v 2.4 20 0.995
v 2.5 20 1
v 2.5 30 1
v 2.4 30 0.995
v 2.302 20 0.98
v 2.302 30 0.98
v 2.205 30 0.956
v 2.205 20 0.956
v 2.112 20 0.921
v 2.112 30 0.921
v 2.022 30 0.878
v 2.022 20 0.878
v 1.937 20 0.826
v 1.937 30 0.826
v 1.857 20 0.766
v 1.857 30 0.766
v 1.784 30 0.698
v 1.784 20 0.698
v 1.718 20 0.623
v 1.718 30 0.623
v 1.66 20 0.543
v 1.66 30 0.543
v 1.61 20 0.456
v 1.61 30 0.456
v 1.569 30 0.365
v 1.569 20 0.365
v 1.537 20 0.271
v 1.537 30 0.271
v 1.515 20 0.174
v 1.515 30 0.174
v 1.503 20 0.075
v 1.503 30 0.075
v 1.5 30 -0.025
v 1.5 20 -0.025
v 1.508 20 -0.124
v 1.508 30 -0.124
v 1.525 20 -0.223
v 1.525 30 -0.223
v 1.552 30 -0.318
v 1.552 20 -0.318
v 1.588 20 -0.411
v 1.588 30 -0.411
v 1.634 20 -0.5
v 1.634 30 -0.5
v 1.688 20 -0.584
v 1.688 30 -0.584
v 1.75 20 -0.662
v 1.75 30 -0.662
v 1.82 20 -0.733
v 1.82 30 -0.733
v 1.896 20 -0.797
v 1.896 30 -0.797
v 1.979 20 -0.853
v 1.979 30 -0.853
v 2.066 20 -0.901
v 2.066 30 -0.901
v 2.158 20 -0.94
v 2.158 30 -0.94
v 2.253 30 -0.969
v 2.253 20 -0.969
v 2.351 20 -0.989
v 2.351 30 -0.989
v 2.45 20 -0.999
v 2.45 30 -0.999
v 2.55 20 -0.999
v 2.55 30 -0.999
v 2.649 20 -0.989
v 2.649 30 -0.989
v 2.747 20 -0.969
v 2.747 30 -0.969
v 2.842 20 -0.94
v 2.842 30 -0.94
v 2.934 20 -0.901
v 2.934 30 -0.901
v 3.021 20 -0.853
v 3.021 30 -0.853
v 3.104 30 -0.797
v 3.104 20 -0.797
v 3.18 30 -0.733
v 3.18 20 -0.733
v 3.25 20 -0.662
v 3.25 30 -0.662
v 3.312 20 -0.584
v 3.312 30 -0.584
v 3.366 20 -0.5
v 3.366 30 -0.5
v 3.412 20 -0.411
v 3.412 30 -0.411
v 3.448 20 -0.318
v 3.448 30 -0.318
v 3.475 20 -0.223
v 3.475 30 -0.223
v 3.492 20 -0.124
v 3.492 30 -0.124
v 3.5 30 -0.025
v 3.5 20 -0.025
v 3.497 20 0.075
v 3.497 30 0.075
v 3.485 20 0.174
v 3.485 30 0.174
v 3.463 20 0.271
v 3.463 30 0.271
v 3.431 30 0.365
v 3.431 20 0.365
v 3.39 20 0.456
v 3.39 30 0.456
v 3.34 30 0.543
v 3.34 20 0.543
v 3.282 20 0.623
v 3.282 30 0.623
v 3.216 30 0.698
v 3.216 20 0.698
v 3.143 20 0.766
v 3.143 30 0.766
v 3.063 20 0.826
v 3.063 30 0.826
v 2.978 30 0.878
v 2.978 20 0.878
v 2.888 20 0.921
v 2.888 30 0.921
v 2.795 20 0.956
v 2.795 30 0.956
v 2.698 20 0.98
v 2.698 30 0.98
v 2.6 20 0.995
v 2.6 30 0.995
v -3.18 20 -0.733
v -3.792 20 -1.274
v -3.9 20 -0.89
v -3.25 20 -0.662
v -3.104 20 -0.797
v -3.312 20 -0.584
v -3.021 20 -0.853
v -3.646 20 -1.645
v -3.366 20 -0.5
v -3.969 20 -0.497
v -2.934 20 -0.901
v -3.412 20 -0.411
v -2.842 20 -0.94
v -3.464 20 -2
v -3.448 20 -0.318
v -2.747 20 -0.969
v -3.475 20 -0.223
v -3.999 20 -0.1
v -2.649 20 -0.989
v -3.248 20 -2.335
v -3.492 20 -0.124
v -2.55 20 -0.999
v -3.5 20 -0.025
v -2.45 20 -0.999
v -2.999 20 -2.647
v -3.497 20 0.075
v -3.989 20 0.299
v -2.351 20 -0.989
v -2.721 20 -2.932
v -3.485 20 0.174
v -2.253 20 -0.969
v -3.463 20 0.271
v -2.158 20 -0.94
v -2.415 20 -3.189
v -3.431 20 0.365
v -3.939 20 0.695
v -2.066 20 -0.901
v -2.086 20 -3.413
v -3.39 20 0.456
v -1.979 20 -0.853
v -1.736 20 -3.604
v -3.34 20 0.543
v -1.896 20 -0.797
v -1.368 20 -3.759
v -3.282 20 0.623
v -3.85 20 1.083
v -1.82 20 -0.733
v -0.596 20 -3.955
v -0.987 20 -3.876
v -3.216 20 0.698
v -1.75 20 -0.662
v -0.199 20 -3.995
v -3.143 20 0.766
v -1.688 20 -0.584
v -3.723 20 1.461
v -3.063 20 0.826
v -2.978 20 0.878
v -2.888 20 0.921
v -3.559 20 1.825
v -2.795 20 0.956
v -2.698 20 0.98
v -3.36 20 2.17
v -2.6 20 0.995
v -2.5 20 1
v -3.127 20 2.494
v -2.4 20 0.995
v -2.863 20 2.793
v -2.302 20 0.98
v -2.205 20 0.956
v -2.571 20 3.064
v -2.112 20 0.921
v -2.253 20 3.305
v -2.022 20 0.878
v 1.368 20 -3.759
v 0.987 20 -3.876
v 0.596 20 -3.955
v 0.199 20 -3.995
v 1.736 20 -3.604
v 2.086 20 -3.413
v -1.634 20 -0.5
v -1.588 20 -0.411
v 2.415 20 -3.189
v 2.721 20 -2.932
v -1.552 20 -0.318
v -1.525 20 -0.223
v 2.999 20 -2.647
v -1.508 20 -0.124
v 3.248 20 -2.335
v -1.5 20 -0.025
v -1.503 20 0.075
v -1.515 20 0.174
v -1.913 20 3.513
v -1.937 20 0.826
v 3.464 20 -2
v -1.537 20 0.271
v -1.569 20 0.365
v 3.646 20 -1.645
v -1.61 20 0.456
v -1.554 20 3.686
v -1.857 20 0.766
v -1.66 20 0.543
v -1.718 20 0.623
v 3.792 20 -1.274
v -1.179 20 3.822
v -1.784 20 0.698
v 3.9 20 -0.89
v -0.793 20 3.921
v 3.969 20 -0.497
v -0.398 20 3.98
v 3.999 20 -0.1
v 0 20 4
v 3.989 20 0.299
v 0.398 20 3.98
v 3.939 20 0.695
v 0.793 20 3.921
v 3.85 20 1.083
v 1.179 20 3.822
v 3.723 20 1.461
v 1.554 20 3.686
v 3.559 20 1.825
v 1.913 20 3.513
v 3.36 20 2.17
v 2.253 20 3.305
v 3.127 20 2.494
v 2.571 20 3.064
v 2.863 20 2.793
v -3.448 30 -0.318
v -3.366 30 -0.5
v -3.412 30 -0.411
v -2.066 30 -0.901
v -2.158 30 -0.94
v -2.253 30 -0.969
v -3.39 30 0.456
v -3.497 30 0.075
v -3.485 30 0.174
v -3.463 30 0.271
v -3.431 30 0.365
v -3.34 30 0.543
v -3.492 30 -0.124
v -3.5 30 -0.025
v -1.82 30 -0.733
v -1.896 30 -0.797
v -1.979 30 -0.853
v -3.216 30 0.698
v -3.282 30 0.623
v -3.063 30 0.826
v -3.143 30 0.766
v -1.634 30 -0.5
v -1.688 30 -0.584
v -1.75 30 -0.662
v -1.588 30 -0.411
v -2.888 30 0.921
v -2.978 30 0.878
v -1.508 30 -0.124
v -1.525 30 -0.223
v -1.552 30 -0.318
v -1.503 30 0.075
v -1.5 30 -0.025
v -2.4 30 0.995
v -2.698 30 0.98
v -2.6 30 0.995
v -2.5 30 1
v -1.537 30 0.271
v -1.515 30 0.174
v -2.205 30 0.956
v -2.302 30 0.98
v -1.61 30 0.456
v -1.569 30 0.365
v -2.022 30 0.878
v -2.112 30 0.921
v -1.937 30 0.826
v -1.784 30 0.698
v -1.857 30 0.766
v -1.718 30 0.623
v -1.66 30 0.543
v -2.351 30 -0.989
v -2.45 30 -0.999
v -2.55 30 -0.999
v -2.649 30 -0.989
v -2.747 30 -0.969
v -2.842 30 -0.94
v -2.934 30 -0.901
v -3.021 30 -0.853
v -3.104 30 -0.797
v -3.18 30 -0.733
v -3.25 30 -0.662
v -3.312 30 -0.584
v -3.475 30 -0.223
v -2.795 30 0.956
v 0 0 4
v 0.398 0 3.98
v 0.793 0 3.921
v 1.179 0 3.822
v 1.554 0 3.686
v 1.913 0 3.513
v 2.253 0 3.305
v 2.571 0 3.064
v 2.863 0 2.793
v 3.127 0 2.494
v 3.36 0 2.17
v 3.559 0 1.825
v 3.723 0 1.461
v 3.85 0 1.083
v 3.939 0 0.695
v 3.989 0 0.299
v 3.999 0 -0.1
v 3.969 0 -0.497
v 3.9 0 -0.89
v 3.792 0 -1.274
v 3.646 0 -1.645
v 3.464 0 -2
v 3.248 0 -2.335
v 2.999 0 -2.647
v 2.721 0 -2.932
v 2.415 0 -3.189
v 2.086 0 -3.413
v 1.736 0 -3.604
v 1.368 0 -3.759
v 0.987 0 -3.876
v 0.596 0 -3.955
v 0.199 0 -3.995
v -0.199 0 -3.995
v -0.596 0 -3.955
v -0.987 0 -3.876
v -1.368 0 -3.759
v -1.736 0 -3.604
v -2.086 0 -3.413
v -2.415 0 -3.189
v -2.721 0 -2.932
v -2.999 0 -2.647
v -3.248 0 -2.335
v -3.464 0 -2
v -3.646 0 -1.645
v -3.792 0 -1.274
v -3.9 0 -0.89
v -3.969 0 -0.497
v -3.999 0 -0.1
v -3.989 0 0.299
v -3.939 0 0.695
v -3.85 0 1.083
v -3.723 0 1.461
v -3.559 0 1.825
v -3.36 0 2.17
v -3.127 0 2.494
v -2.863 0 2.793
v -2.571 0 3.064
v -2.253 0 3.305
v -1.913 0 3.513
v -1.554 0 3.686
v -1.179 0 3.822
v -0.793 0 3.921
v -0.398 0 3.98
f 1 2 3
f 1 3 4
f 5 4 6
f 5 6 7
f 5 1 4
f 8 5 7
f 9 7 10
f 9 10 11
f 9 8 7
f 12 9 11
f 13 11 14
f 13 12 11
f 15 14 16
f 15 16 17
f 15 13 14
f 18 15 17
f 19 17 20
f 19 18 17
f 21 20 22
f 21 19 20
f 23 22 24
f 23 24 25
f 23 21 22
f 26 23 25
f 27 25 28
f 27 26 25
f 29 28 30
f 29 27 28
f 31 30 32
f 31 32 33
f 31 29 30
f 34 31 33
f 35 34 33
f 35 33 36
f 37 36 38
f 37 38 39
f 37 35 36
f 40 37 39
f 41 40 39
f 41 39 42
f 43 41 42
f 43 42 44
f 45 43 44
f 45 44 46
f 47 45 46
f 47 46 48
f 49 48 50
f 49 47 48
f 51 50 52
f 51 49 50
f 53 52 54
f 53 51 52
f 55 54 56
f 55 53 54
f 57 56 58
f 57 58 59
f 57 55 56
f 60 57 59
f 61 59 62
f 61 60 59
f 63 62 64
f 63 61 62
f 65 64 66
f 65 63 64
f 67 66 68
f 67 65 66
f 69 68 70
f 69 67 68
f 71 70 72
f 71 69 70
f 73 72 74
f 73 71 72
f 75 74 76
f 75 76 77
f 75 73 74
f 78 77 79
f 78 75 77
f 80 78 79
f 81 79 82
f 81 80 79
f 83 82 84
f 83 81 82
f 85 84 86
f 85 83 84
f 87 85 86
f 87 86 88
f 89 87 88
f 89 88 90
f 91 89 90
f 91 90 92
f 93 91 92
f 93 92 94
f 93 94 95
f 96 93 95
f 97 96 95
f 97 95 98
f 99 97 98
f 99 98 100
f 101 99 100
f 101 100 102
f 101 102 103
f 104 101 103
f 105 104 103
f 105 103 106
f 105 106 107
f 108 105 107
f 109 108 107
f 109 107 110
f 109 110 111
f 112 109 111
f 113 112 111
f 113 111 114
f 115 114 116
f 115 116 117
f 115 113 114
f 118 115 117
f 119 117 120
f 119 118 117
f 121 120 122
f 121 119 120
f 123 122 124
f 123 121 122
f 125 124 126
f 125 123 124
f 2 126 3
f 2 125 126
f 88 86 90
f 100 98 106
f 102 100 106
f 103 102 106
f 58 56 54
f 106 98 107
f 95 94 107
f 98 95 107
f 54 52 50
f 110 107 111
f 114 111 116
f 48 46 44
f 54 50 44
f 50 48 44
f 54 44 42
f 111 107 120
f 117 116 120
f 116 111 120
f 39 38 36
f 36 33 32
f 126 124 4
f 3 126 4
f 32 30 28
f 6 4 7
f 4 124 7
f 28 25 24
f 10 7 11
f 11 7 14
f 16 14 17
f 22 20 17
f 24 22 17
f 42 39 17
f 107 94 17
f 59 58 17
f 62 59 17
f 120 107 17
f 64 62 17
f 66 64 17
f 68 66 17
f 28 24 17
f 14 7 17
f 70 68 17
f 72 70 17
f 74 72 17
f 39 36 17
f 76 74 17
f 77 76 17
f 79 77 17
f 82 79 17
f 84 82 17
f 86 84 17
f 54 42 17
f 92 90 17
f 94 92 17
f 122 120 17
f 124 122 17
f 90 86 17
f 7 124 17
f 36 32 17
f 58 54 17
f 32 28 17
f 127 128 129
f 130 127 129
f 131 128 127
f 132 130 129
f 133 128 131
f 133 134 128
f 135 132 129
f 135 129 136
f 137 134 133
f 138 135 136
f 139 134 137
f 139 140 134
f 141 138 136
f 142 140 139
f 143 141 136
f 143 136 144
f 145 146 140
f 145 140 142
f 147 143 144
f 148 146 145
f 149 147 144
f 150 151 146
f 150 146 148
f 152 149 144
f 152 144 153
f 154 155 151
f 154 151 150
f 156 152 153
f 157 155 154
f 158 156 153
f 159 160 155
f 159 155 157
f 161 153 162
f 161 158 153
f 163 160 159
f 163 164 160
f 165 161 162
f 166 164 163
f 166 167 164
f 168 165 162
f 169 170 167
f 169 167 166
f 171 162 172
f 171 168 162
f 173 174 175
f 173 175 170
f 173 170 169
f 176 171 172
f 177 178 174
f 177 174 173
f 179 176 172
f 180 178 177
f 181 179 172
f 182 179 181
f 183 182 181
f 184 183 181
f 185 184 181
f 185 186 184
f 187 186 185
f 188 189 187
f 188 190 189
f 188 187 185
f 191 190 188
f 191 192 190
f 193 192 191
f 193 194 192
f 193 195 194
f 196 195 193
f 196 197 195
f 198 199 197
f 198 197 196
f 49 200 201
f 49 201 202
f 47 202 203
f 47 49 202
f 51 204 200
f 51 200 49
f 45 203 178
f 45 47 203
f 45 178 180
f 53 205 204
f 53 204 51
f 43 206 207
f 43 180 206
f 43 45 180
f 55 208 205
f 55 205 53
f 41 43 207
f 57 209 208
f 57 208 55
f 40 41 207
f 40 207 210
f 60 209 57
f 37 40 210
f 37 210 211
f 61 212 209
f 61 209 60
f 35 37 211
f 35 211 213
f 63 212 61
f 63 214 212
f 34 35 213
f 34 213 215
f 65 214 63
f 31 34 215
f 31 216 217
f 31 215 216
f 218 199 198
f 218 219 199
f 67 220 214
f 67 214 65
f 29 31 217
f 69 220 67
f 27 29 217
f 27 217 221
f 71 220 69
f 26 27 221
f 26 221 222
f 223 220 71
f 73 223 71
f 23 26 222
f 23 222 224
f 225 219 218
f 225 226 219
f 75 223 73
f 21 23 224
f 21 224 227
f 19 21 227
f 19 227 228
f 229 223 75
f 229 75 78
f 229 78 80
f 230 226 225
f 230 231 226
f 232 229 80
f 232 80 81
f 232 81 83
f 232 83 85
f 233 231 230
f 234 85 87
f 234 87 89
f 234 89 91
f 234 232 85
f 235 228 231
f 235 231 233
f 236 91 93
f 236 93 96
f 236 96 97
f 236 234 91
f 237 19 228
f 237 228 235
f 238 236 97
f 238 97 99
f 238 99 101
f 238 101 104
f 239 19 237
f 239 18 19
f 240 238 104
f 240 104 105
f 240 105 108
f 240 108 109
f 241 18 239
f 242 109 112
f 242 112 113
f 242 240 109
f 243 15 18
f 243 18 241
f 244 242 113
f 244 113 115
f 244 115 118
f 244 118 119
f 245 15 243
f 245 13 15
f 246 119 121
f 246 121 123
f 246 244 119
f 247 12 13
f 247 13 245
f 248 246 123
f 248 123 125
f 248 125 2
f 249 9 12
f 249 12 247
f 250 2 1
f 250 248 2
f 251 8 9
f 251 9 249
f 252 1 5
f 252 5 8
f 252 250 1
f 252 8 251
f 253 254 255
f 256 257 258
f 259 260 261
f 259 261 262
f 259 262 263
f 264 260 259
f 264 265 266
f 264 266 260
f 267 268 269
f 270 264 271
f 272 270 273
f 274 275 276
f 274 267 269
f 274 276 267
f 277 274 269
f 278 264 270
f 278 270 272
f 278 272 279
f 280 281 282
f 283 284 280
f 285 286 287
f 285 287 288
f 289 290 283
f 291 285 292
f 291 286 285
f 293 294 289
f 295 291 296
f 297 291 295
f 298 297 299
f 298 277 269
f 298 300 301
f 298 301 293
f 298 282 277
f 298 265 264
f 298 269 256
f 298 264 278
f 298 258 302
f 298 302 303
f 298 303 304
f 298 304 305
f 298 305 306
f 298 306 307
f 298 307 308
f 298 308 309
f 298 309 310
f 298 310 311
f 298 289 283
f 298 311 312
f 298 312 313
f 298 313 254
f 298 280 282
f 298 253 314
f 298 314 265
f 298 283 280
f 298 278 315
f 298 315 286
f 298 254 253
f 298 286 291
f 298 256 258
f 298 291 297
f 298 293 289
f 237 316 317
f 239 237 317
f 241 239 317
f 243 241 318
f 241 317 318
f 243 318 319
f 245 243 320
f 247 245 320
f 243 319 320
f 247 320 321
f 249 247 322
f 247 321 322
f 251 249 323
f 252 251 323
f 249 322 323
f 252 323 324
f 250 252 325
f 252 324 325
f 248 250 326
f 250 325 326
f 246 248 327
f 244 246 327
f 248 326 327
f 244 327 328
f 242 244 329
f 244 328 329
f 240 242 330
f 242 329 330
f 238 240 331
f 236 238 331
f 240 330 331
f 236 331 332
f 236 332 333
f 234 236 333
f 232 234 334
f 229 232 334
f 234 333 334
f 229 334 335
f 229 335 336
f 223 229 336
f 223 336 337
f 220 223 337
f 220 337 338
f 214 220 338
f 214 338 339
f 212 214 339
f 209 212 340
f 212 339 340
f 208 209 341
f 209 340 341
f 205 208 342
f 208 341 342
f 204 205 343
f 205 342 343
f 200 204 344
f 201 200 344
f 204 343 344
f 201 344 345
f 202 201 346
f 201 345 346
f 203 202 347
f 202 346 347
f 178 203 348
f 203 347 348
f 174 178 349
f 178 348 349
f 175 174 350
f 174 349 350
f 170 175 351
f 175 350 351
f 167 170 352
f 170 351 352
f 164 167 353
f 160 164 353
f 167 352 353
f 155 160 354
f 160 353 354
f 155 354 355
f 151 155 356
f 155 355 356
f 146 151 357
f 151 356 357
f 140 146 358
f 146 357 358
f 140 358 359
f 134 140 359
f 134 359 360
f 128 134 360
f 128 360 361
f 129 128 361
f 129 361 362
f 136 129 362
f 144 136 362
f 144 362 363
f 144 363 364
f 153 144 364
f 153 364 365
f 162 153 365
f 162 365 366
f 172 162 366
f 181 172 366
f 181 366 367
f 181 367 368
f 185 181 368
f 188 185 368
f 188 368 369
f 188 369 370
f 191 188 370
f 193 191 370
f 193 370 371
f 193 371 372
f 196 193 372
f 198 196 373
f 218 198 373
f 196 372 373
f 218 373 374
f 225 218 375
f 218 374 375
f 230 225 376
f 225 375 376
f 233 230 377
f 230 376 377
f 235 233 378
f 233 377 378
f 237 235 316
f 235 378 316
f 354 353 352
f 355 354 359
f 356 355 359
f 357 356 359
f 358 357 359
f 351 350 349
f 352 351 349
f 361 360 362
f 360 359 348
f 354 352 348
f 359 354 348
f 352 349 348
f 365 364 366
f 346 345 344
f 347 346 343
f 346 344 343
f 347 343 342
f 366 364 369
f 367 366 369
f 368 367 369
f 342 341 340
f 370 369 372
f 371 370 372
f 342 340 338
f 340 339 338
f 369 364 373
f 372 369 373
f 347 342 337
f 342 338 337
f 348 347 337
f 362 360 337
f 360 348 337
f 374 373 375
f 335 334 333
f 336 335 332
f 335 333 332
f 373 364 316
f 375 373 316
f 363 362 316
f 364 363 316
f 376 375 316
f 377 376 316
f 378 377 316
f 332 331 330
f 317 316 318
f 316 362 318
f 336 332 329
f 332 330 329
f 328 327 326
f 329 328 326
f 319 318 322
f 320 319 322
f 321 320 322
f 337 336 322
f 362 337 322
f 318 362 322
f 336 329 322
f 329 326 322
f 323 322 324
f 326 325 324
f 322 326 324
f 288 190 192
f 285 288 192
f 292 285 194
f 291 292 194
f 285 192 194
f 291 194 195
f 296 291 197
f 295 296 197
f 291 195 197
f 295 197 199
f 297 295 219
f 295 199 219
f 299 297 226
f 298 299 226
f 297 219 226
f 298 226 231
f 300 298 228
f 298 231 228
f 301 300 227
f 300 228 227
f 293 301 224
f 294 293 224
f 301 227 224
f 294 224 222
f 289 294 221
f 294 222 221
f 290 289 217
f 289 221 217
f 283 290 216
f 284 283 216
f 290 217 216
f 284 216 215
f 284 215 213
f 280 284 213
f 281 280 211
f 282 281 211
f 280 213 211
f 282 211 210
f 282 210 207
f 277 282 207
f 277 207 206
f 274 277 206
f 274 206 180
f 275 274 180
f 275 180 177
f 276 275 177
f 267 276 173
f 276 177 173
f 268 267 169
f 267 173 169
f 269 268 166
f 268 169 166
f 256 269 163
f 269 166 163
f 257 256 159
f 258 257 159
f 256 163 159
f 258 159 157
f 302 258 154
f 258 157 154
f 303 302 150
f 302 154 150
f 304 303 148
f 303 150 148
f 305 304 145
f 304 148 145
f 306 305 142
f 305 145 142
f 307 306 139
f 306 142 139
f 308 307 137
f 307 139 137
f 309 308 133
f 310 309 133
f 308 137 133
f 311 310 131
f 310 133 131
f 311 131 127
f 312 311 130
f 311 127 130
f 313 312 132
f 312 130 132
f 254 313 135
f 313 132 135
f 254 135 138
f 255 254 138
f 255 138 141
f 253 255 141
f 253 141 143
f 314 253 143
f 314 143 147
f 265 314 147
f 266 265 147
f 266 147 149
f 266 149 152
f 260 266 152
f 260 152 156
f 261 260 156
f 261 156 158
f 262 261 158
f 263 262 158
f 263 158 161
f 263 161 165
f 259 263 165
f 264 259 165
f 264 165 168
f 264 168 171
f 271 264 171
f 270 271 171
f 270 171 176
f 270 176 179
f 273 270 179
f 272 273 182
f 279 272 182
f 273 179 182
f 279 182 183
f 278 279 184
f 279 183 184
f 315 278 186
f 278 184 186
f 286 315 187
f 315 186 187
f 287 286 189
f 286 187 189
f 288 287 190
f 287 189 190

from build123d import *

# Parameters (mm, degrees)
SKETCH_1_R      = 4
EXTRUDE_1_DEPTH = 20
SKETCH_2_R      = 1
EXTRUDE_2_DEPTH = 10


with BuildPart() as part:
    # 草图1 → 凸台-拉伸1 (new body)
    with BuildSketch(Plane(origin=(0, 0, 0), x_dir=(1, 0, 0), z_dir=(0, 1, 0))):
        with Locations(Location((0, 0, 0), (0, 0, 270))):
            Circle(SKETCH_1_R)
    extrude(amount=EXTRUDE_1_DEPTH)

    # 草图2 → 凸台-拉伸2 (add)
    with BuildSketch(Plane(origin=(0, 20, 0), x_dir=(1, 0, 0), z_dir=(0, 1, 0))):
        with Locations(Location((-2.5, 0, 0), (0, 0, 270))):
            Circle(SKETCH_2_R)
    extrude_2 = extrude(amount=EXTRUDE_2_DEPTH)

    # 镜向1: 凸台-拉伸2 across plane
    add(extrude_2.mirror(Plane(origin=(0, 0, 0), x_dir=(0, 0, 1), z_dir=(1, 0, 0))))


solid = part.part
